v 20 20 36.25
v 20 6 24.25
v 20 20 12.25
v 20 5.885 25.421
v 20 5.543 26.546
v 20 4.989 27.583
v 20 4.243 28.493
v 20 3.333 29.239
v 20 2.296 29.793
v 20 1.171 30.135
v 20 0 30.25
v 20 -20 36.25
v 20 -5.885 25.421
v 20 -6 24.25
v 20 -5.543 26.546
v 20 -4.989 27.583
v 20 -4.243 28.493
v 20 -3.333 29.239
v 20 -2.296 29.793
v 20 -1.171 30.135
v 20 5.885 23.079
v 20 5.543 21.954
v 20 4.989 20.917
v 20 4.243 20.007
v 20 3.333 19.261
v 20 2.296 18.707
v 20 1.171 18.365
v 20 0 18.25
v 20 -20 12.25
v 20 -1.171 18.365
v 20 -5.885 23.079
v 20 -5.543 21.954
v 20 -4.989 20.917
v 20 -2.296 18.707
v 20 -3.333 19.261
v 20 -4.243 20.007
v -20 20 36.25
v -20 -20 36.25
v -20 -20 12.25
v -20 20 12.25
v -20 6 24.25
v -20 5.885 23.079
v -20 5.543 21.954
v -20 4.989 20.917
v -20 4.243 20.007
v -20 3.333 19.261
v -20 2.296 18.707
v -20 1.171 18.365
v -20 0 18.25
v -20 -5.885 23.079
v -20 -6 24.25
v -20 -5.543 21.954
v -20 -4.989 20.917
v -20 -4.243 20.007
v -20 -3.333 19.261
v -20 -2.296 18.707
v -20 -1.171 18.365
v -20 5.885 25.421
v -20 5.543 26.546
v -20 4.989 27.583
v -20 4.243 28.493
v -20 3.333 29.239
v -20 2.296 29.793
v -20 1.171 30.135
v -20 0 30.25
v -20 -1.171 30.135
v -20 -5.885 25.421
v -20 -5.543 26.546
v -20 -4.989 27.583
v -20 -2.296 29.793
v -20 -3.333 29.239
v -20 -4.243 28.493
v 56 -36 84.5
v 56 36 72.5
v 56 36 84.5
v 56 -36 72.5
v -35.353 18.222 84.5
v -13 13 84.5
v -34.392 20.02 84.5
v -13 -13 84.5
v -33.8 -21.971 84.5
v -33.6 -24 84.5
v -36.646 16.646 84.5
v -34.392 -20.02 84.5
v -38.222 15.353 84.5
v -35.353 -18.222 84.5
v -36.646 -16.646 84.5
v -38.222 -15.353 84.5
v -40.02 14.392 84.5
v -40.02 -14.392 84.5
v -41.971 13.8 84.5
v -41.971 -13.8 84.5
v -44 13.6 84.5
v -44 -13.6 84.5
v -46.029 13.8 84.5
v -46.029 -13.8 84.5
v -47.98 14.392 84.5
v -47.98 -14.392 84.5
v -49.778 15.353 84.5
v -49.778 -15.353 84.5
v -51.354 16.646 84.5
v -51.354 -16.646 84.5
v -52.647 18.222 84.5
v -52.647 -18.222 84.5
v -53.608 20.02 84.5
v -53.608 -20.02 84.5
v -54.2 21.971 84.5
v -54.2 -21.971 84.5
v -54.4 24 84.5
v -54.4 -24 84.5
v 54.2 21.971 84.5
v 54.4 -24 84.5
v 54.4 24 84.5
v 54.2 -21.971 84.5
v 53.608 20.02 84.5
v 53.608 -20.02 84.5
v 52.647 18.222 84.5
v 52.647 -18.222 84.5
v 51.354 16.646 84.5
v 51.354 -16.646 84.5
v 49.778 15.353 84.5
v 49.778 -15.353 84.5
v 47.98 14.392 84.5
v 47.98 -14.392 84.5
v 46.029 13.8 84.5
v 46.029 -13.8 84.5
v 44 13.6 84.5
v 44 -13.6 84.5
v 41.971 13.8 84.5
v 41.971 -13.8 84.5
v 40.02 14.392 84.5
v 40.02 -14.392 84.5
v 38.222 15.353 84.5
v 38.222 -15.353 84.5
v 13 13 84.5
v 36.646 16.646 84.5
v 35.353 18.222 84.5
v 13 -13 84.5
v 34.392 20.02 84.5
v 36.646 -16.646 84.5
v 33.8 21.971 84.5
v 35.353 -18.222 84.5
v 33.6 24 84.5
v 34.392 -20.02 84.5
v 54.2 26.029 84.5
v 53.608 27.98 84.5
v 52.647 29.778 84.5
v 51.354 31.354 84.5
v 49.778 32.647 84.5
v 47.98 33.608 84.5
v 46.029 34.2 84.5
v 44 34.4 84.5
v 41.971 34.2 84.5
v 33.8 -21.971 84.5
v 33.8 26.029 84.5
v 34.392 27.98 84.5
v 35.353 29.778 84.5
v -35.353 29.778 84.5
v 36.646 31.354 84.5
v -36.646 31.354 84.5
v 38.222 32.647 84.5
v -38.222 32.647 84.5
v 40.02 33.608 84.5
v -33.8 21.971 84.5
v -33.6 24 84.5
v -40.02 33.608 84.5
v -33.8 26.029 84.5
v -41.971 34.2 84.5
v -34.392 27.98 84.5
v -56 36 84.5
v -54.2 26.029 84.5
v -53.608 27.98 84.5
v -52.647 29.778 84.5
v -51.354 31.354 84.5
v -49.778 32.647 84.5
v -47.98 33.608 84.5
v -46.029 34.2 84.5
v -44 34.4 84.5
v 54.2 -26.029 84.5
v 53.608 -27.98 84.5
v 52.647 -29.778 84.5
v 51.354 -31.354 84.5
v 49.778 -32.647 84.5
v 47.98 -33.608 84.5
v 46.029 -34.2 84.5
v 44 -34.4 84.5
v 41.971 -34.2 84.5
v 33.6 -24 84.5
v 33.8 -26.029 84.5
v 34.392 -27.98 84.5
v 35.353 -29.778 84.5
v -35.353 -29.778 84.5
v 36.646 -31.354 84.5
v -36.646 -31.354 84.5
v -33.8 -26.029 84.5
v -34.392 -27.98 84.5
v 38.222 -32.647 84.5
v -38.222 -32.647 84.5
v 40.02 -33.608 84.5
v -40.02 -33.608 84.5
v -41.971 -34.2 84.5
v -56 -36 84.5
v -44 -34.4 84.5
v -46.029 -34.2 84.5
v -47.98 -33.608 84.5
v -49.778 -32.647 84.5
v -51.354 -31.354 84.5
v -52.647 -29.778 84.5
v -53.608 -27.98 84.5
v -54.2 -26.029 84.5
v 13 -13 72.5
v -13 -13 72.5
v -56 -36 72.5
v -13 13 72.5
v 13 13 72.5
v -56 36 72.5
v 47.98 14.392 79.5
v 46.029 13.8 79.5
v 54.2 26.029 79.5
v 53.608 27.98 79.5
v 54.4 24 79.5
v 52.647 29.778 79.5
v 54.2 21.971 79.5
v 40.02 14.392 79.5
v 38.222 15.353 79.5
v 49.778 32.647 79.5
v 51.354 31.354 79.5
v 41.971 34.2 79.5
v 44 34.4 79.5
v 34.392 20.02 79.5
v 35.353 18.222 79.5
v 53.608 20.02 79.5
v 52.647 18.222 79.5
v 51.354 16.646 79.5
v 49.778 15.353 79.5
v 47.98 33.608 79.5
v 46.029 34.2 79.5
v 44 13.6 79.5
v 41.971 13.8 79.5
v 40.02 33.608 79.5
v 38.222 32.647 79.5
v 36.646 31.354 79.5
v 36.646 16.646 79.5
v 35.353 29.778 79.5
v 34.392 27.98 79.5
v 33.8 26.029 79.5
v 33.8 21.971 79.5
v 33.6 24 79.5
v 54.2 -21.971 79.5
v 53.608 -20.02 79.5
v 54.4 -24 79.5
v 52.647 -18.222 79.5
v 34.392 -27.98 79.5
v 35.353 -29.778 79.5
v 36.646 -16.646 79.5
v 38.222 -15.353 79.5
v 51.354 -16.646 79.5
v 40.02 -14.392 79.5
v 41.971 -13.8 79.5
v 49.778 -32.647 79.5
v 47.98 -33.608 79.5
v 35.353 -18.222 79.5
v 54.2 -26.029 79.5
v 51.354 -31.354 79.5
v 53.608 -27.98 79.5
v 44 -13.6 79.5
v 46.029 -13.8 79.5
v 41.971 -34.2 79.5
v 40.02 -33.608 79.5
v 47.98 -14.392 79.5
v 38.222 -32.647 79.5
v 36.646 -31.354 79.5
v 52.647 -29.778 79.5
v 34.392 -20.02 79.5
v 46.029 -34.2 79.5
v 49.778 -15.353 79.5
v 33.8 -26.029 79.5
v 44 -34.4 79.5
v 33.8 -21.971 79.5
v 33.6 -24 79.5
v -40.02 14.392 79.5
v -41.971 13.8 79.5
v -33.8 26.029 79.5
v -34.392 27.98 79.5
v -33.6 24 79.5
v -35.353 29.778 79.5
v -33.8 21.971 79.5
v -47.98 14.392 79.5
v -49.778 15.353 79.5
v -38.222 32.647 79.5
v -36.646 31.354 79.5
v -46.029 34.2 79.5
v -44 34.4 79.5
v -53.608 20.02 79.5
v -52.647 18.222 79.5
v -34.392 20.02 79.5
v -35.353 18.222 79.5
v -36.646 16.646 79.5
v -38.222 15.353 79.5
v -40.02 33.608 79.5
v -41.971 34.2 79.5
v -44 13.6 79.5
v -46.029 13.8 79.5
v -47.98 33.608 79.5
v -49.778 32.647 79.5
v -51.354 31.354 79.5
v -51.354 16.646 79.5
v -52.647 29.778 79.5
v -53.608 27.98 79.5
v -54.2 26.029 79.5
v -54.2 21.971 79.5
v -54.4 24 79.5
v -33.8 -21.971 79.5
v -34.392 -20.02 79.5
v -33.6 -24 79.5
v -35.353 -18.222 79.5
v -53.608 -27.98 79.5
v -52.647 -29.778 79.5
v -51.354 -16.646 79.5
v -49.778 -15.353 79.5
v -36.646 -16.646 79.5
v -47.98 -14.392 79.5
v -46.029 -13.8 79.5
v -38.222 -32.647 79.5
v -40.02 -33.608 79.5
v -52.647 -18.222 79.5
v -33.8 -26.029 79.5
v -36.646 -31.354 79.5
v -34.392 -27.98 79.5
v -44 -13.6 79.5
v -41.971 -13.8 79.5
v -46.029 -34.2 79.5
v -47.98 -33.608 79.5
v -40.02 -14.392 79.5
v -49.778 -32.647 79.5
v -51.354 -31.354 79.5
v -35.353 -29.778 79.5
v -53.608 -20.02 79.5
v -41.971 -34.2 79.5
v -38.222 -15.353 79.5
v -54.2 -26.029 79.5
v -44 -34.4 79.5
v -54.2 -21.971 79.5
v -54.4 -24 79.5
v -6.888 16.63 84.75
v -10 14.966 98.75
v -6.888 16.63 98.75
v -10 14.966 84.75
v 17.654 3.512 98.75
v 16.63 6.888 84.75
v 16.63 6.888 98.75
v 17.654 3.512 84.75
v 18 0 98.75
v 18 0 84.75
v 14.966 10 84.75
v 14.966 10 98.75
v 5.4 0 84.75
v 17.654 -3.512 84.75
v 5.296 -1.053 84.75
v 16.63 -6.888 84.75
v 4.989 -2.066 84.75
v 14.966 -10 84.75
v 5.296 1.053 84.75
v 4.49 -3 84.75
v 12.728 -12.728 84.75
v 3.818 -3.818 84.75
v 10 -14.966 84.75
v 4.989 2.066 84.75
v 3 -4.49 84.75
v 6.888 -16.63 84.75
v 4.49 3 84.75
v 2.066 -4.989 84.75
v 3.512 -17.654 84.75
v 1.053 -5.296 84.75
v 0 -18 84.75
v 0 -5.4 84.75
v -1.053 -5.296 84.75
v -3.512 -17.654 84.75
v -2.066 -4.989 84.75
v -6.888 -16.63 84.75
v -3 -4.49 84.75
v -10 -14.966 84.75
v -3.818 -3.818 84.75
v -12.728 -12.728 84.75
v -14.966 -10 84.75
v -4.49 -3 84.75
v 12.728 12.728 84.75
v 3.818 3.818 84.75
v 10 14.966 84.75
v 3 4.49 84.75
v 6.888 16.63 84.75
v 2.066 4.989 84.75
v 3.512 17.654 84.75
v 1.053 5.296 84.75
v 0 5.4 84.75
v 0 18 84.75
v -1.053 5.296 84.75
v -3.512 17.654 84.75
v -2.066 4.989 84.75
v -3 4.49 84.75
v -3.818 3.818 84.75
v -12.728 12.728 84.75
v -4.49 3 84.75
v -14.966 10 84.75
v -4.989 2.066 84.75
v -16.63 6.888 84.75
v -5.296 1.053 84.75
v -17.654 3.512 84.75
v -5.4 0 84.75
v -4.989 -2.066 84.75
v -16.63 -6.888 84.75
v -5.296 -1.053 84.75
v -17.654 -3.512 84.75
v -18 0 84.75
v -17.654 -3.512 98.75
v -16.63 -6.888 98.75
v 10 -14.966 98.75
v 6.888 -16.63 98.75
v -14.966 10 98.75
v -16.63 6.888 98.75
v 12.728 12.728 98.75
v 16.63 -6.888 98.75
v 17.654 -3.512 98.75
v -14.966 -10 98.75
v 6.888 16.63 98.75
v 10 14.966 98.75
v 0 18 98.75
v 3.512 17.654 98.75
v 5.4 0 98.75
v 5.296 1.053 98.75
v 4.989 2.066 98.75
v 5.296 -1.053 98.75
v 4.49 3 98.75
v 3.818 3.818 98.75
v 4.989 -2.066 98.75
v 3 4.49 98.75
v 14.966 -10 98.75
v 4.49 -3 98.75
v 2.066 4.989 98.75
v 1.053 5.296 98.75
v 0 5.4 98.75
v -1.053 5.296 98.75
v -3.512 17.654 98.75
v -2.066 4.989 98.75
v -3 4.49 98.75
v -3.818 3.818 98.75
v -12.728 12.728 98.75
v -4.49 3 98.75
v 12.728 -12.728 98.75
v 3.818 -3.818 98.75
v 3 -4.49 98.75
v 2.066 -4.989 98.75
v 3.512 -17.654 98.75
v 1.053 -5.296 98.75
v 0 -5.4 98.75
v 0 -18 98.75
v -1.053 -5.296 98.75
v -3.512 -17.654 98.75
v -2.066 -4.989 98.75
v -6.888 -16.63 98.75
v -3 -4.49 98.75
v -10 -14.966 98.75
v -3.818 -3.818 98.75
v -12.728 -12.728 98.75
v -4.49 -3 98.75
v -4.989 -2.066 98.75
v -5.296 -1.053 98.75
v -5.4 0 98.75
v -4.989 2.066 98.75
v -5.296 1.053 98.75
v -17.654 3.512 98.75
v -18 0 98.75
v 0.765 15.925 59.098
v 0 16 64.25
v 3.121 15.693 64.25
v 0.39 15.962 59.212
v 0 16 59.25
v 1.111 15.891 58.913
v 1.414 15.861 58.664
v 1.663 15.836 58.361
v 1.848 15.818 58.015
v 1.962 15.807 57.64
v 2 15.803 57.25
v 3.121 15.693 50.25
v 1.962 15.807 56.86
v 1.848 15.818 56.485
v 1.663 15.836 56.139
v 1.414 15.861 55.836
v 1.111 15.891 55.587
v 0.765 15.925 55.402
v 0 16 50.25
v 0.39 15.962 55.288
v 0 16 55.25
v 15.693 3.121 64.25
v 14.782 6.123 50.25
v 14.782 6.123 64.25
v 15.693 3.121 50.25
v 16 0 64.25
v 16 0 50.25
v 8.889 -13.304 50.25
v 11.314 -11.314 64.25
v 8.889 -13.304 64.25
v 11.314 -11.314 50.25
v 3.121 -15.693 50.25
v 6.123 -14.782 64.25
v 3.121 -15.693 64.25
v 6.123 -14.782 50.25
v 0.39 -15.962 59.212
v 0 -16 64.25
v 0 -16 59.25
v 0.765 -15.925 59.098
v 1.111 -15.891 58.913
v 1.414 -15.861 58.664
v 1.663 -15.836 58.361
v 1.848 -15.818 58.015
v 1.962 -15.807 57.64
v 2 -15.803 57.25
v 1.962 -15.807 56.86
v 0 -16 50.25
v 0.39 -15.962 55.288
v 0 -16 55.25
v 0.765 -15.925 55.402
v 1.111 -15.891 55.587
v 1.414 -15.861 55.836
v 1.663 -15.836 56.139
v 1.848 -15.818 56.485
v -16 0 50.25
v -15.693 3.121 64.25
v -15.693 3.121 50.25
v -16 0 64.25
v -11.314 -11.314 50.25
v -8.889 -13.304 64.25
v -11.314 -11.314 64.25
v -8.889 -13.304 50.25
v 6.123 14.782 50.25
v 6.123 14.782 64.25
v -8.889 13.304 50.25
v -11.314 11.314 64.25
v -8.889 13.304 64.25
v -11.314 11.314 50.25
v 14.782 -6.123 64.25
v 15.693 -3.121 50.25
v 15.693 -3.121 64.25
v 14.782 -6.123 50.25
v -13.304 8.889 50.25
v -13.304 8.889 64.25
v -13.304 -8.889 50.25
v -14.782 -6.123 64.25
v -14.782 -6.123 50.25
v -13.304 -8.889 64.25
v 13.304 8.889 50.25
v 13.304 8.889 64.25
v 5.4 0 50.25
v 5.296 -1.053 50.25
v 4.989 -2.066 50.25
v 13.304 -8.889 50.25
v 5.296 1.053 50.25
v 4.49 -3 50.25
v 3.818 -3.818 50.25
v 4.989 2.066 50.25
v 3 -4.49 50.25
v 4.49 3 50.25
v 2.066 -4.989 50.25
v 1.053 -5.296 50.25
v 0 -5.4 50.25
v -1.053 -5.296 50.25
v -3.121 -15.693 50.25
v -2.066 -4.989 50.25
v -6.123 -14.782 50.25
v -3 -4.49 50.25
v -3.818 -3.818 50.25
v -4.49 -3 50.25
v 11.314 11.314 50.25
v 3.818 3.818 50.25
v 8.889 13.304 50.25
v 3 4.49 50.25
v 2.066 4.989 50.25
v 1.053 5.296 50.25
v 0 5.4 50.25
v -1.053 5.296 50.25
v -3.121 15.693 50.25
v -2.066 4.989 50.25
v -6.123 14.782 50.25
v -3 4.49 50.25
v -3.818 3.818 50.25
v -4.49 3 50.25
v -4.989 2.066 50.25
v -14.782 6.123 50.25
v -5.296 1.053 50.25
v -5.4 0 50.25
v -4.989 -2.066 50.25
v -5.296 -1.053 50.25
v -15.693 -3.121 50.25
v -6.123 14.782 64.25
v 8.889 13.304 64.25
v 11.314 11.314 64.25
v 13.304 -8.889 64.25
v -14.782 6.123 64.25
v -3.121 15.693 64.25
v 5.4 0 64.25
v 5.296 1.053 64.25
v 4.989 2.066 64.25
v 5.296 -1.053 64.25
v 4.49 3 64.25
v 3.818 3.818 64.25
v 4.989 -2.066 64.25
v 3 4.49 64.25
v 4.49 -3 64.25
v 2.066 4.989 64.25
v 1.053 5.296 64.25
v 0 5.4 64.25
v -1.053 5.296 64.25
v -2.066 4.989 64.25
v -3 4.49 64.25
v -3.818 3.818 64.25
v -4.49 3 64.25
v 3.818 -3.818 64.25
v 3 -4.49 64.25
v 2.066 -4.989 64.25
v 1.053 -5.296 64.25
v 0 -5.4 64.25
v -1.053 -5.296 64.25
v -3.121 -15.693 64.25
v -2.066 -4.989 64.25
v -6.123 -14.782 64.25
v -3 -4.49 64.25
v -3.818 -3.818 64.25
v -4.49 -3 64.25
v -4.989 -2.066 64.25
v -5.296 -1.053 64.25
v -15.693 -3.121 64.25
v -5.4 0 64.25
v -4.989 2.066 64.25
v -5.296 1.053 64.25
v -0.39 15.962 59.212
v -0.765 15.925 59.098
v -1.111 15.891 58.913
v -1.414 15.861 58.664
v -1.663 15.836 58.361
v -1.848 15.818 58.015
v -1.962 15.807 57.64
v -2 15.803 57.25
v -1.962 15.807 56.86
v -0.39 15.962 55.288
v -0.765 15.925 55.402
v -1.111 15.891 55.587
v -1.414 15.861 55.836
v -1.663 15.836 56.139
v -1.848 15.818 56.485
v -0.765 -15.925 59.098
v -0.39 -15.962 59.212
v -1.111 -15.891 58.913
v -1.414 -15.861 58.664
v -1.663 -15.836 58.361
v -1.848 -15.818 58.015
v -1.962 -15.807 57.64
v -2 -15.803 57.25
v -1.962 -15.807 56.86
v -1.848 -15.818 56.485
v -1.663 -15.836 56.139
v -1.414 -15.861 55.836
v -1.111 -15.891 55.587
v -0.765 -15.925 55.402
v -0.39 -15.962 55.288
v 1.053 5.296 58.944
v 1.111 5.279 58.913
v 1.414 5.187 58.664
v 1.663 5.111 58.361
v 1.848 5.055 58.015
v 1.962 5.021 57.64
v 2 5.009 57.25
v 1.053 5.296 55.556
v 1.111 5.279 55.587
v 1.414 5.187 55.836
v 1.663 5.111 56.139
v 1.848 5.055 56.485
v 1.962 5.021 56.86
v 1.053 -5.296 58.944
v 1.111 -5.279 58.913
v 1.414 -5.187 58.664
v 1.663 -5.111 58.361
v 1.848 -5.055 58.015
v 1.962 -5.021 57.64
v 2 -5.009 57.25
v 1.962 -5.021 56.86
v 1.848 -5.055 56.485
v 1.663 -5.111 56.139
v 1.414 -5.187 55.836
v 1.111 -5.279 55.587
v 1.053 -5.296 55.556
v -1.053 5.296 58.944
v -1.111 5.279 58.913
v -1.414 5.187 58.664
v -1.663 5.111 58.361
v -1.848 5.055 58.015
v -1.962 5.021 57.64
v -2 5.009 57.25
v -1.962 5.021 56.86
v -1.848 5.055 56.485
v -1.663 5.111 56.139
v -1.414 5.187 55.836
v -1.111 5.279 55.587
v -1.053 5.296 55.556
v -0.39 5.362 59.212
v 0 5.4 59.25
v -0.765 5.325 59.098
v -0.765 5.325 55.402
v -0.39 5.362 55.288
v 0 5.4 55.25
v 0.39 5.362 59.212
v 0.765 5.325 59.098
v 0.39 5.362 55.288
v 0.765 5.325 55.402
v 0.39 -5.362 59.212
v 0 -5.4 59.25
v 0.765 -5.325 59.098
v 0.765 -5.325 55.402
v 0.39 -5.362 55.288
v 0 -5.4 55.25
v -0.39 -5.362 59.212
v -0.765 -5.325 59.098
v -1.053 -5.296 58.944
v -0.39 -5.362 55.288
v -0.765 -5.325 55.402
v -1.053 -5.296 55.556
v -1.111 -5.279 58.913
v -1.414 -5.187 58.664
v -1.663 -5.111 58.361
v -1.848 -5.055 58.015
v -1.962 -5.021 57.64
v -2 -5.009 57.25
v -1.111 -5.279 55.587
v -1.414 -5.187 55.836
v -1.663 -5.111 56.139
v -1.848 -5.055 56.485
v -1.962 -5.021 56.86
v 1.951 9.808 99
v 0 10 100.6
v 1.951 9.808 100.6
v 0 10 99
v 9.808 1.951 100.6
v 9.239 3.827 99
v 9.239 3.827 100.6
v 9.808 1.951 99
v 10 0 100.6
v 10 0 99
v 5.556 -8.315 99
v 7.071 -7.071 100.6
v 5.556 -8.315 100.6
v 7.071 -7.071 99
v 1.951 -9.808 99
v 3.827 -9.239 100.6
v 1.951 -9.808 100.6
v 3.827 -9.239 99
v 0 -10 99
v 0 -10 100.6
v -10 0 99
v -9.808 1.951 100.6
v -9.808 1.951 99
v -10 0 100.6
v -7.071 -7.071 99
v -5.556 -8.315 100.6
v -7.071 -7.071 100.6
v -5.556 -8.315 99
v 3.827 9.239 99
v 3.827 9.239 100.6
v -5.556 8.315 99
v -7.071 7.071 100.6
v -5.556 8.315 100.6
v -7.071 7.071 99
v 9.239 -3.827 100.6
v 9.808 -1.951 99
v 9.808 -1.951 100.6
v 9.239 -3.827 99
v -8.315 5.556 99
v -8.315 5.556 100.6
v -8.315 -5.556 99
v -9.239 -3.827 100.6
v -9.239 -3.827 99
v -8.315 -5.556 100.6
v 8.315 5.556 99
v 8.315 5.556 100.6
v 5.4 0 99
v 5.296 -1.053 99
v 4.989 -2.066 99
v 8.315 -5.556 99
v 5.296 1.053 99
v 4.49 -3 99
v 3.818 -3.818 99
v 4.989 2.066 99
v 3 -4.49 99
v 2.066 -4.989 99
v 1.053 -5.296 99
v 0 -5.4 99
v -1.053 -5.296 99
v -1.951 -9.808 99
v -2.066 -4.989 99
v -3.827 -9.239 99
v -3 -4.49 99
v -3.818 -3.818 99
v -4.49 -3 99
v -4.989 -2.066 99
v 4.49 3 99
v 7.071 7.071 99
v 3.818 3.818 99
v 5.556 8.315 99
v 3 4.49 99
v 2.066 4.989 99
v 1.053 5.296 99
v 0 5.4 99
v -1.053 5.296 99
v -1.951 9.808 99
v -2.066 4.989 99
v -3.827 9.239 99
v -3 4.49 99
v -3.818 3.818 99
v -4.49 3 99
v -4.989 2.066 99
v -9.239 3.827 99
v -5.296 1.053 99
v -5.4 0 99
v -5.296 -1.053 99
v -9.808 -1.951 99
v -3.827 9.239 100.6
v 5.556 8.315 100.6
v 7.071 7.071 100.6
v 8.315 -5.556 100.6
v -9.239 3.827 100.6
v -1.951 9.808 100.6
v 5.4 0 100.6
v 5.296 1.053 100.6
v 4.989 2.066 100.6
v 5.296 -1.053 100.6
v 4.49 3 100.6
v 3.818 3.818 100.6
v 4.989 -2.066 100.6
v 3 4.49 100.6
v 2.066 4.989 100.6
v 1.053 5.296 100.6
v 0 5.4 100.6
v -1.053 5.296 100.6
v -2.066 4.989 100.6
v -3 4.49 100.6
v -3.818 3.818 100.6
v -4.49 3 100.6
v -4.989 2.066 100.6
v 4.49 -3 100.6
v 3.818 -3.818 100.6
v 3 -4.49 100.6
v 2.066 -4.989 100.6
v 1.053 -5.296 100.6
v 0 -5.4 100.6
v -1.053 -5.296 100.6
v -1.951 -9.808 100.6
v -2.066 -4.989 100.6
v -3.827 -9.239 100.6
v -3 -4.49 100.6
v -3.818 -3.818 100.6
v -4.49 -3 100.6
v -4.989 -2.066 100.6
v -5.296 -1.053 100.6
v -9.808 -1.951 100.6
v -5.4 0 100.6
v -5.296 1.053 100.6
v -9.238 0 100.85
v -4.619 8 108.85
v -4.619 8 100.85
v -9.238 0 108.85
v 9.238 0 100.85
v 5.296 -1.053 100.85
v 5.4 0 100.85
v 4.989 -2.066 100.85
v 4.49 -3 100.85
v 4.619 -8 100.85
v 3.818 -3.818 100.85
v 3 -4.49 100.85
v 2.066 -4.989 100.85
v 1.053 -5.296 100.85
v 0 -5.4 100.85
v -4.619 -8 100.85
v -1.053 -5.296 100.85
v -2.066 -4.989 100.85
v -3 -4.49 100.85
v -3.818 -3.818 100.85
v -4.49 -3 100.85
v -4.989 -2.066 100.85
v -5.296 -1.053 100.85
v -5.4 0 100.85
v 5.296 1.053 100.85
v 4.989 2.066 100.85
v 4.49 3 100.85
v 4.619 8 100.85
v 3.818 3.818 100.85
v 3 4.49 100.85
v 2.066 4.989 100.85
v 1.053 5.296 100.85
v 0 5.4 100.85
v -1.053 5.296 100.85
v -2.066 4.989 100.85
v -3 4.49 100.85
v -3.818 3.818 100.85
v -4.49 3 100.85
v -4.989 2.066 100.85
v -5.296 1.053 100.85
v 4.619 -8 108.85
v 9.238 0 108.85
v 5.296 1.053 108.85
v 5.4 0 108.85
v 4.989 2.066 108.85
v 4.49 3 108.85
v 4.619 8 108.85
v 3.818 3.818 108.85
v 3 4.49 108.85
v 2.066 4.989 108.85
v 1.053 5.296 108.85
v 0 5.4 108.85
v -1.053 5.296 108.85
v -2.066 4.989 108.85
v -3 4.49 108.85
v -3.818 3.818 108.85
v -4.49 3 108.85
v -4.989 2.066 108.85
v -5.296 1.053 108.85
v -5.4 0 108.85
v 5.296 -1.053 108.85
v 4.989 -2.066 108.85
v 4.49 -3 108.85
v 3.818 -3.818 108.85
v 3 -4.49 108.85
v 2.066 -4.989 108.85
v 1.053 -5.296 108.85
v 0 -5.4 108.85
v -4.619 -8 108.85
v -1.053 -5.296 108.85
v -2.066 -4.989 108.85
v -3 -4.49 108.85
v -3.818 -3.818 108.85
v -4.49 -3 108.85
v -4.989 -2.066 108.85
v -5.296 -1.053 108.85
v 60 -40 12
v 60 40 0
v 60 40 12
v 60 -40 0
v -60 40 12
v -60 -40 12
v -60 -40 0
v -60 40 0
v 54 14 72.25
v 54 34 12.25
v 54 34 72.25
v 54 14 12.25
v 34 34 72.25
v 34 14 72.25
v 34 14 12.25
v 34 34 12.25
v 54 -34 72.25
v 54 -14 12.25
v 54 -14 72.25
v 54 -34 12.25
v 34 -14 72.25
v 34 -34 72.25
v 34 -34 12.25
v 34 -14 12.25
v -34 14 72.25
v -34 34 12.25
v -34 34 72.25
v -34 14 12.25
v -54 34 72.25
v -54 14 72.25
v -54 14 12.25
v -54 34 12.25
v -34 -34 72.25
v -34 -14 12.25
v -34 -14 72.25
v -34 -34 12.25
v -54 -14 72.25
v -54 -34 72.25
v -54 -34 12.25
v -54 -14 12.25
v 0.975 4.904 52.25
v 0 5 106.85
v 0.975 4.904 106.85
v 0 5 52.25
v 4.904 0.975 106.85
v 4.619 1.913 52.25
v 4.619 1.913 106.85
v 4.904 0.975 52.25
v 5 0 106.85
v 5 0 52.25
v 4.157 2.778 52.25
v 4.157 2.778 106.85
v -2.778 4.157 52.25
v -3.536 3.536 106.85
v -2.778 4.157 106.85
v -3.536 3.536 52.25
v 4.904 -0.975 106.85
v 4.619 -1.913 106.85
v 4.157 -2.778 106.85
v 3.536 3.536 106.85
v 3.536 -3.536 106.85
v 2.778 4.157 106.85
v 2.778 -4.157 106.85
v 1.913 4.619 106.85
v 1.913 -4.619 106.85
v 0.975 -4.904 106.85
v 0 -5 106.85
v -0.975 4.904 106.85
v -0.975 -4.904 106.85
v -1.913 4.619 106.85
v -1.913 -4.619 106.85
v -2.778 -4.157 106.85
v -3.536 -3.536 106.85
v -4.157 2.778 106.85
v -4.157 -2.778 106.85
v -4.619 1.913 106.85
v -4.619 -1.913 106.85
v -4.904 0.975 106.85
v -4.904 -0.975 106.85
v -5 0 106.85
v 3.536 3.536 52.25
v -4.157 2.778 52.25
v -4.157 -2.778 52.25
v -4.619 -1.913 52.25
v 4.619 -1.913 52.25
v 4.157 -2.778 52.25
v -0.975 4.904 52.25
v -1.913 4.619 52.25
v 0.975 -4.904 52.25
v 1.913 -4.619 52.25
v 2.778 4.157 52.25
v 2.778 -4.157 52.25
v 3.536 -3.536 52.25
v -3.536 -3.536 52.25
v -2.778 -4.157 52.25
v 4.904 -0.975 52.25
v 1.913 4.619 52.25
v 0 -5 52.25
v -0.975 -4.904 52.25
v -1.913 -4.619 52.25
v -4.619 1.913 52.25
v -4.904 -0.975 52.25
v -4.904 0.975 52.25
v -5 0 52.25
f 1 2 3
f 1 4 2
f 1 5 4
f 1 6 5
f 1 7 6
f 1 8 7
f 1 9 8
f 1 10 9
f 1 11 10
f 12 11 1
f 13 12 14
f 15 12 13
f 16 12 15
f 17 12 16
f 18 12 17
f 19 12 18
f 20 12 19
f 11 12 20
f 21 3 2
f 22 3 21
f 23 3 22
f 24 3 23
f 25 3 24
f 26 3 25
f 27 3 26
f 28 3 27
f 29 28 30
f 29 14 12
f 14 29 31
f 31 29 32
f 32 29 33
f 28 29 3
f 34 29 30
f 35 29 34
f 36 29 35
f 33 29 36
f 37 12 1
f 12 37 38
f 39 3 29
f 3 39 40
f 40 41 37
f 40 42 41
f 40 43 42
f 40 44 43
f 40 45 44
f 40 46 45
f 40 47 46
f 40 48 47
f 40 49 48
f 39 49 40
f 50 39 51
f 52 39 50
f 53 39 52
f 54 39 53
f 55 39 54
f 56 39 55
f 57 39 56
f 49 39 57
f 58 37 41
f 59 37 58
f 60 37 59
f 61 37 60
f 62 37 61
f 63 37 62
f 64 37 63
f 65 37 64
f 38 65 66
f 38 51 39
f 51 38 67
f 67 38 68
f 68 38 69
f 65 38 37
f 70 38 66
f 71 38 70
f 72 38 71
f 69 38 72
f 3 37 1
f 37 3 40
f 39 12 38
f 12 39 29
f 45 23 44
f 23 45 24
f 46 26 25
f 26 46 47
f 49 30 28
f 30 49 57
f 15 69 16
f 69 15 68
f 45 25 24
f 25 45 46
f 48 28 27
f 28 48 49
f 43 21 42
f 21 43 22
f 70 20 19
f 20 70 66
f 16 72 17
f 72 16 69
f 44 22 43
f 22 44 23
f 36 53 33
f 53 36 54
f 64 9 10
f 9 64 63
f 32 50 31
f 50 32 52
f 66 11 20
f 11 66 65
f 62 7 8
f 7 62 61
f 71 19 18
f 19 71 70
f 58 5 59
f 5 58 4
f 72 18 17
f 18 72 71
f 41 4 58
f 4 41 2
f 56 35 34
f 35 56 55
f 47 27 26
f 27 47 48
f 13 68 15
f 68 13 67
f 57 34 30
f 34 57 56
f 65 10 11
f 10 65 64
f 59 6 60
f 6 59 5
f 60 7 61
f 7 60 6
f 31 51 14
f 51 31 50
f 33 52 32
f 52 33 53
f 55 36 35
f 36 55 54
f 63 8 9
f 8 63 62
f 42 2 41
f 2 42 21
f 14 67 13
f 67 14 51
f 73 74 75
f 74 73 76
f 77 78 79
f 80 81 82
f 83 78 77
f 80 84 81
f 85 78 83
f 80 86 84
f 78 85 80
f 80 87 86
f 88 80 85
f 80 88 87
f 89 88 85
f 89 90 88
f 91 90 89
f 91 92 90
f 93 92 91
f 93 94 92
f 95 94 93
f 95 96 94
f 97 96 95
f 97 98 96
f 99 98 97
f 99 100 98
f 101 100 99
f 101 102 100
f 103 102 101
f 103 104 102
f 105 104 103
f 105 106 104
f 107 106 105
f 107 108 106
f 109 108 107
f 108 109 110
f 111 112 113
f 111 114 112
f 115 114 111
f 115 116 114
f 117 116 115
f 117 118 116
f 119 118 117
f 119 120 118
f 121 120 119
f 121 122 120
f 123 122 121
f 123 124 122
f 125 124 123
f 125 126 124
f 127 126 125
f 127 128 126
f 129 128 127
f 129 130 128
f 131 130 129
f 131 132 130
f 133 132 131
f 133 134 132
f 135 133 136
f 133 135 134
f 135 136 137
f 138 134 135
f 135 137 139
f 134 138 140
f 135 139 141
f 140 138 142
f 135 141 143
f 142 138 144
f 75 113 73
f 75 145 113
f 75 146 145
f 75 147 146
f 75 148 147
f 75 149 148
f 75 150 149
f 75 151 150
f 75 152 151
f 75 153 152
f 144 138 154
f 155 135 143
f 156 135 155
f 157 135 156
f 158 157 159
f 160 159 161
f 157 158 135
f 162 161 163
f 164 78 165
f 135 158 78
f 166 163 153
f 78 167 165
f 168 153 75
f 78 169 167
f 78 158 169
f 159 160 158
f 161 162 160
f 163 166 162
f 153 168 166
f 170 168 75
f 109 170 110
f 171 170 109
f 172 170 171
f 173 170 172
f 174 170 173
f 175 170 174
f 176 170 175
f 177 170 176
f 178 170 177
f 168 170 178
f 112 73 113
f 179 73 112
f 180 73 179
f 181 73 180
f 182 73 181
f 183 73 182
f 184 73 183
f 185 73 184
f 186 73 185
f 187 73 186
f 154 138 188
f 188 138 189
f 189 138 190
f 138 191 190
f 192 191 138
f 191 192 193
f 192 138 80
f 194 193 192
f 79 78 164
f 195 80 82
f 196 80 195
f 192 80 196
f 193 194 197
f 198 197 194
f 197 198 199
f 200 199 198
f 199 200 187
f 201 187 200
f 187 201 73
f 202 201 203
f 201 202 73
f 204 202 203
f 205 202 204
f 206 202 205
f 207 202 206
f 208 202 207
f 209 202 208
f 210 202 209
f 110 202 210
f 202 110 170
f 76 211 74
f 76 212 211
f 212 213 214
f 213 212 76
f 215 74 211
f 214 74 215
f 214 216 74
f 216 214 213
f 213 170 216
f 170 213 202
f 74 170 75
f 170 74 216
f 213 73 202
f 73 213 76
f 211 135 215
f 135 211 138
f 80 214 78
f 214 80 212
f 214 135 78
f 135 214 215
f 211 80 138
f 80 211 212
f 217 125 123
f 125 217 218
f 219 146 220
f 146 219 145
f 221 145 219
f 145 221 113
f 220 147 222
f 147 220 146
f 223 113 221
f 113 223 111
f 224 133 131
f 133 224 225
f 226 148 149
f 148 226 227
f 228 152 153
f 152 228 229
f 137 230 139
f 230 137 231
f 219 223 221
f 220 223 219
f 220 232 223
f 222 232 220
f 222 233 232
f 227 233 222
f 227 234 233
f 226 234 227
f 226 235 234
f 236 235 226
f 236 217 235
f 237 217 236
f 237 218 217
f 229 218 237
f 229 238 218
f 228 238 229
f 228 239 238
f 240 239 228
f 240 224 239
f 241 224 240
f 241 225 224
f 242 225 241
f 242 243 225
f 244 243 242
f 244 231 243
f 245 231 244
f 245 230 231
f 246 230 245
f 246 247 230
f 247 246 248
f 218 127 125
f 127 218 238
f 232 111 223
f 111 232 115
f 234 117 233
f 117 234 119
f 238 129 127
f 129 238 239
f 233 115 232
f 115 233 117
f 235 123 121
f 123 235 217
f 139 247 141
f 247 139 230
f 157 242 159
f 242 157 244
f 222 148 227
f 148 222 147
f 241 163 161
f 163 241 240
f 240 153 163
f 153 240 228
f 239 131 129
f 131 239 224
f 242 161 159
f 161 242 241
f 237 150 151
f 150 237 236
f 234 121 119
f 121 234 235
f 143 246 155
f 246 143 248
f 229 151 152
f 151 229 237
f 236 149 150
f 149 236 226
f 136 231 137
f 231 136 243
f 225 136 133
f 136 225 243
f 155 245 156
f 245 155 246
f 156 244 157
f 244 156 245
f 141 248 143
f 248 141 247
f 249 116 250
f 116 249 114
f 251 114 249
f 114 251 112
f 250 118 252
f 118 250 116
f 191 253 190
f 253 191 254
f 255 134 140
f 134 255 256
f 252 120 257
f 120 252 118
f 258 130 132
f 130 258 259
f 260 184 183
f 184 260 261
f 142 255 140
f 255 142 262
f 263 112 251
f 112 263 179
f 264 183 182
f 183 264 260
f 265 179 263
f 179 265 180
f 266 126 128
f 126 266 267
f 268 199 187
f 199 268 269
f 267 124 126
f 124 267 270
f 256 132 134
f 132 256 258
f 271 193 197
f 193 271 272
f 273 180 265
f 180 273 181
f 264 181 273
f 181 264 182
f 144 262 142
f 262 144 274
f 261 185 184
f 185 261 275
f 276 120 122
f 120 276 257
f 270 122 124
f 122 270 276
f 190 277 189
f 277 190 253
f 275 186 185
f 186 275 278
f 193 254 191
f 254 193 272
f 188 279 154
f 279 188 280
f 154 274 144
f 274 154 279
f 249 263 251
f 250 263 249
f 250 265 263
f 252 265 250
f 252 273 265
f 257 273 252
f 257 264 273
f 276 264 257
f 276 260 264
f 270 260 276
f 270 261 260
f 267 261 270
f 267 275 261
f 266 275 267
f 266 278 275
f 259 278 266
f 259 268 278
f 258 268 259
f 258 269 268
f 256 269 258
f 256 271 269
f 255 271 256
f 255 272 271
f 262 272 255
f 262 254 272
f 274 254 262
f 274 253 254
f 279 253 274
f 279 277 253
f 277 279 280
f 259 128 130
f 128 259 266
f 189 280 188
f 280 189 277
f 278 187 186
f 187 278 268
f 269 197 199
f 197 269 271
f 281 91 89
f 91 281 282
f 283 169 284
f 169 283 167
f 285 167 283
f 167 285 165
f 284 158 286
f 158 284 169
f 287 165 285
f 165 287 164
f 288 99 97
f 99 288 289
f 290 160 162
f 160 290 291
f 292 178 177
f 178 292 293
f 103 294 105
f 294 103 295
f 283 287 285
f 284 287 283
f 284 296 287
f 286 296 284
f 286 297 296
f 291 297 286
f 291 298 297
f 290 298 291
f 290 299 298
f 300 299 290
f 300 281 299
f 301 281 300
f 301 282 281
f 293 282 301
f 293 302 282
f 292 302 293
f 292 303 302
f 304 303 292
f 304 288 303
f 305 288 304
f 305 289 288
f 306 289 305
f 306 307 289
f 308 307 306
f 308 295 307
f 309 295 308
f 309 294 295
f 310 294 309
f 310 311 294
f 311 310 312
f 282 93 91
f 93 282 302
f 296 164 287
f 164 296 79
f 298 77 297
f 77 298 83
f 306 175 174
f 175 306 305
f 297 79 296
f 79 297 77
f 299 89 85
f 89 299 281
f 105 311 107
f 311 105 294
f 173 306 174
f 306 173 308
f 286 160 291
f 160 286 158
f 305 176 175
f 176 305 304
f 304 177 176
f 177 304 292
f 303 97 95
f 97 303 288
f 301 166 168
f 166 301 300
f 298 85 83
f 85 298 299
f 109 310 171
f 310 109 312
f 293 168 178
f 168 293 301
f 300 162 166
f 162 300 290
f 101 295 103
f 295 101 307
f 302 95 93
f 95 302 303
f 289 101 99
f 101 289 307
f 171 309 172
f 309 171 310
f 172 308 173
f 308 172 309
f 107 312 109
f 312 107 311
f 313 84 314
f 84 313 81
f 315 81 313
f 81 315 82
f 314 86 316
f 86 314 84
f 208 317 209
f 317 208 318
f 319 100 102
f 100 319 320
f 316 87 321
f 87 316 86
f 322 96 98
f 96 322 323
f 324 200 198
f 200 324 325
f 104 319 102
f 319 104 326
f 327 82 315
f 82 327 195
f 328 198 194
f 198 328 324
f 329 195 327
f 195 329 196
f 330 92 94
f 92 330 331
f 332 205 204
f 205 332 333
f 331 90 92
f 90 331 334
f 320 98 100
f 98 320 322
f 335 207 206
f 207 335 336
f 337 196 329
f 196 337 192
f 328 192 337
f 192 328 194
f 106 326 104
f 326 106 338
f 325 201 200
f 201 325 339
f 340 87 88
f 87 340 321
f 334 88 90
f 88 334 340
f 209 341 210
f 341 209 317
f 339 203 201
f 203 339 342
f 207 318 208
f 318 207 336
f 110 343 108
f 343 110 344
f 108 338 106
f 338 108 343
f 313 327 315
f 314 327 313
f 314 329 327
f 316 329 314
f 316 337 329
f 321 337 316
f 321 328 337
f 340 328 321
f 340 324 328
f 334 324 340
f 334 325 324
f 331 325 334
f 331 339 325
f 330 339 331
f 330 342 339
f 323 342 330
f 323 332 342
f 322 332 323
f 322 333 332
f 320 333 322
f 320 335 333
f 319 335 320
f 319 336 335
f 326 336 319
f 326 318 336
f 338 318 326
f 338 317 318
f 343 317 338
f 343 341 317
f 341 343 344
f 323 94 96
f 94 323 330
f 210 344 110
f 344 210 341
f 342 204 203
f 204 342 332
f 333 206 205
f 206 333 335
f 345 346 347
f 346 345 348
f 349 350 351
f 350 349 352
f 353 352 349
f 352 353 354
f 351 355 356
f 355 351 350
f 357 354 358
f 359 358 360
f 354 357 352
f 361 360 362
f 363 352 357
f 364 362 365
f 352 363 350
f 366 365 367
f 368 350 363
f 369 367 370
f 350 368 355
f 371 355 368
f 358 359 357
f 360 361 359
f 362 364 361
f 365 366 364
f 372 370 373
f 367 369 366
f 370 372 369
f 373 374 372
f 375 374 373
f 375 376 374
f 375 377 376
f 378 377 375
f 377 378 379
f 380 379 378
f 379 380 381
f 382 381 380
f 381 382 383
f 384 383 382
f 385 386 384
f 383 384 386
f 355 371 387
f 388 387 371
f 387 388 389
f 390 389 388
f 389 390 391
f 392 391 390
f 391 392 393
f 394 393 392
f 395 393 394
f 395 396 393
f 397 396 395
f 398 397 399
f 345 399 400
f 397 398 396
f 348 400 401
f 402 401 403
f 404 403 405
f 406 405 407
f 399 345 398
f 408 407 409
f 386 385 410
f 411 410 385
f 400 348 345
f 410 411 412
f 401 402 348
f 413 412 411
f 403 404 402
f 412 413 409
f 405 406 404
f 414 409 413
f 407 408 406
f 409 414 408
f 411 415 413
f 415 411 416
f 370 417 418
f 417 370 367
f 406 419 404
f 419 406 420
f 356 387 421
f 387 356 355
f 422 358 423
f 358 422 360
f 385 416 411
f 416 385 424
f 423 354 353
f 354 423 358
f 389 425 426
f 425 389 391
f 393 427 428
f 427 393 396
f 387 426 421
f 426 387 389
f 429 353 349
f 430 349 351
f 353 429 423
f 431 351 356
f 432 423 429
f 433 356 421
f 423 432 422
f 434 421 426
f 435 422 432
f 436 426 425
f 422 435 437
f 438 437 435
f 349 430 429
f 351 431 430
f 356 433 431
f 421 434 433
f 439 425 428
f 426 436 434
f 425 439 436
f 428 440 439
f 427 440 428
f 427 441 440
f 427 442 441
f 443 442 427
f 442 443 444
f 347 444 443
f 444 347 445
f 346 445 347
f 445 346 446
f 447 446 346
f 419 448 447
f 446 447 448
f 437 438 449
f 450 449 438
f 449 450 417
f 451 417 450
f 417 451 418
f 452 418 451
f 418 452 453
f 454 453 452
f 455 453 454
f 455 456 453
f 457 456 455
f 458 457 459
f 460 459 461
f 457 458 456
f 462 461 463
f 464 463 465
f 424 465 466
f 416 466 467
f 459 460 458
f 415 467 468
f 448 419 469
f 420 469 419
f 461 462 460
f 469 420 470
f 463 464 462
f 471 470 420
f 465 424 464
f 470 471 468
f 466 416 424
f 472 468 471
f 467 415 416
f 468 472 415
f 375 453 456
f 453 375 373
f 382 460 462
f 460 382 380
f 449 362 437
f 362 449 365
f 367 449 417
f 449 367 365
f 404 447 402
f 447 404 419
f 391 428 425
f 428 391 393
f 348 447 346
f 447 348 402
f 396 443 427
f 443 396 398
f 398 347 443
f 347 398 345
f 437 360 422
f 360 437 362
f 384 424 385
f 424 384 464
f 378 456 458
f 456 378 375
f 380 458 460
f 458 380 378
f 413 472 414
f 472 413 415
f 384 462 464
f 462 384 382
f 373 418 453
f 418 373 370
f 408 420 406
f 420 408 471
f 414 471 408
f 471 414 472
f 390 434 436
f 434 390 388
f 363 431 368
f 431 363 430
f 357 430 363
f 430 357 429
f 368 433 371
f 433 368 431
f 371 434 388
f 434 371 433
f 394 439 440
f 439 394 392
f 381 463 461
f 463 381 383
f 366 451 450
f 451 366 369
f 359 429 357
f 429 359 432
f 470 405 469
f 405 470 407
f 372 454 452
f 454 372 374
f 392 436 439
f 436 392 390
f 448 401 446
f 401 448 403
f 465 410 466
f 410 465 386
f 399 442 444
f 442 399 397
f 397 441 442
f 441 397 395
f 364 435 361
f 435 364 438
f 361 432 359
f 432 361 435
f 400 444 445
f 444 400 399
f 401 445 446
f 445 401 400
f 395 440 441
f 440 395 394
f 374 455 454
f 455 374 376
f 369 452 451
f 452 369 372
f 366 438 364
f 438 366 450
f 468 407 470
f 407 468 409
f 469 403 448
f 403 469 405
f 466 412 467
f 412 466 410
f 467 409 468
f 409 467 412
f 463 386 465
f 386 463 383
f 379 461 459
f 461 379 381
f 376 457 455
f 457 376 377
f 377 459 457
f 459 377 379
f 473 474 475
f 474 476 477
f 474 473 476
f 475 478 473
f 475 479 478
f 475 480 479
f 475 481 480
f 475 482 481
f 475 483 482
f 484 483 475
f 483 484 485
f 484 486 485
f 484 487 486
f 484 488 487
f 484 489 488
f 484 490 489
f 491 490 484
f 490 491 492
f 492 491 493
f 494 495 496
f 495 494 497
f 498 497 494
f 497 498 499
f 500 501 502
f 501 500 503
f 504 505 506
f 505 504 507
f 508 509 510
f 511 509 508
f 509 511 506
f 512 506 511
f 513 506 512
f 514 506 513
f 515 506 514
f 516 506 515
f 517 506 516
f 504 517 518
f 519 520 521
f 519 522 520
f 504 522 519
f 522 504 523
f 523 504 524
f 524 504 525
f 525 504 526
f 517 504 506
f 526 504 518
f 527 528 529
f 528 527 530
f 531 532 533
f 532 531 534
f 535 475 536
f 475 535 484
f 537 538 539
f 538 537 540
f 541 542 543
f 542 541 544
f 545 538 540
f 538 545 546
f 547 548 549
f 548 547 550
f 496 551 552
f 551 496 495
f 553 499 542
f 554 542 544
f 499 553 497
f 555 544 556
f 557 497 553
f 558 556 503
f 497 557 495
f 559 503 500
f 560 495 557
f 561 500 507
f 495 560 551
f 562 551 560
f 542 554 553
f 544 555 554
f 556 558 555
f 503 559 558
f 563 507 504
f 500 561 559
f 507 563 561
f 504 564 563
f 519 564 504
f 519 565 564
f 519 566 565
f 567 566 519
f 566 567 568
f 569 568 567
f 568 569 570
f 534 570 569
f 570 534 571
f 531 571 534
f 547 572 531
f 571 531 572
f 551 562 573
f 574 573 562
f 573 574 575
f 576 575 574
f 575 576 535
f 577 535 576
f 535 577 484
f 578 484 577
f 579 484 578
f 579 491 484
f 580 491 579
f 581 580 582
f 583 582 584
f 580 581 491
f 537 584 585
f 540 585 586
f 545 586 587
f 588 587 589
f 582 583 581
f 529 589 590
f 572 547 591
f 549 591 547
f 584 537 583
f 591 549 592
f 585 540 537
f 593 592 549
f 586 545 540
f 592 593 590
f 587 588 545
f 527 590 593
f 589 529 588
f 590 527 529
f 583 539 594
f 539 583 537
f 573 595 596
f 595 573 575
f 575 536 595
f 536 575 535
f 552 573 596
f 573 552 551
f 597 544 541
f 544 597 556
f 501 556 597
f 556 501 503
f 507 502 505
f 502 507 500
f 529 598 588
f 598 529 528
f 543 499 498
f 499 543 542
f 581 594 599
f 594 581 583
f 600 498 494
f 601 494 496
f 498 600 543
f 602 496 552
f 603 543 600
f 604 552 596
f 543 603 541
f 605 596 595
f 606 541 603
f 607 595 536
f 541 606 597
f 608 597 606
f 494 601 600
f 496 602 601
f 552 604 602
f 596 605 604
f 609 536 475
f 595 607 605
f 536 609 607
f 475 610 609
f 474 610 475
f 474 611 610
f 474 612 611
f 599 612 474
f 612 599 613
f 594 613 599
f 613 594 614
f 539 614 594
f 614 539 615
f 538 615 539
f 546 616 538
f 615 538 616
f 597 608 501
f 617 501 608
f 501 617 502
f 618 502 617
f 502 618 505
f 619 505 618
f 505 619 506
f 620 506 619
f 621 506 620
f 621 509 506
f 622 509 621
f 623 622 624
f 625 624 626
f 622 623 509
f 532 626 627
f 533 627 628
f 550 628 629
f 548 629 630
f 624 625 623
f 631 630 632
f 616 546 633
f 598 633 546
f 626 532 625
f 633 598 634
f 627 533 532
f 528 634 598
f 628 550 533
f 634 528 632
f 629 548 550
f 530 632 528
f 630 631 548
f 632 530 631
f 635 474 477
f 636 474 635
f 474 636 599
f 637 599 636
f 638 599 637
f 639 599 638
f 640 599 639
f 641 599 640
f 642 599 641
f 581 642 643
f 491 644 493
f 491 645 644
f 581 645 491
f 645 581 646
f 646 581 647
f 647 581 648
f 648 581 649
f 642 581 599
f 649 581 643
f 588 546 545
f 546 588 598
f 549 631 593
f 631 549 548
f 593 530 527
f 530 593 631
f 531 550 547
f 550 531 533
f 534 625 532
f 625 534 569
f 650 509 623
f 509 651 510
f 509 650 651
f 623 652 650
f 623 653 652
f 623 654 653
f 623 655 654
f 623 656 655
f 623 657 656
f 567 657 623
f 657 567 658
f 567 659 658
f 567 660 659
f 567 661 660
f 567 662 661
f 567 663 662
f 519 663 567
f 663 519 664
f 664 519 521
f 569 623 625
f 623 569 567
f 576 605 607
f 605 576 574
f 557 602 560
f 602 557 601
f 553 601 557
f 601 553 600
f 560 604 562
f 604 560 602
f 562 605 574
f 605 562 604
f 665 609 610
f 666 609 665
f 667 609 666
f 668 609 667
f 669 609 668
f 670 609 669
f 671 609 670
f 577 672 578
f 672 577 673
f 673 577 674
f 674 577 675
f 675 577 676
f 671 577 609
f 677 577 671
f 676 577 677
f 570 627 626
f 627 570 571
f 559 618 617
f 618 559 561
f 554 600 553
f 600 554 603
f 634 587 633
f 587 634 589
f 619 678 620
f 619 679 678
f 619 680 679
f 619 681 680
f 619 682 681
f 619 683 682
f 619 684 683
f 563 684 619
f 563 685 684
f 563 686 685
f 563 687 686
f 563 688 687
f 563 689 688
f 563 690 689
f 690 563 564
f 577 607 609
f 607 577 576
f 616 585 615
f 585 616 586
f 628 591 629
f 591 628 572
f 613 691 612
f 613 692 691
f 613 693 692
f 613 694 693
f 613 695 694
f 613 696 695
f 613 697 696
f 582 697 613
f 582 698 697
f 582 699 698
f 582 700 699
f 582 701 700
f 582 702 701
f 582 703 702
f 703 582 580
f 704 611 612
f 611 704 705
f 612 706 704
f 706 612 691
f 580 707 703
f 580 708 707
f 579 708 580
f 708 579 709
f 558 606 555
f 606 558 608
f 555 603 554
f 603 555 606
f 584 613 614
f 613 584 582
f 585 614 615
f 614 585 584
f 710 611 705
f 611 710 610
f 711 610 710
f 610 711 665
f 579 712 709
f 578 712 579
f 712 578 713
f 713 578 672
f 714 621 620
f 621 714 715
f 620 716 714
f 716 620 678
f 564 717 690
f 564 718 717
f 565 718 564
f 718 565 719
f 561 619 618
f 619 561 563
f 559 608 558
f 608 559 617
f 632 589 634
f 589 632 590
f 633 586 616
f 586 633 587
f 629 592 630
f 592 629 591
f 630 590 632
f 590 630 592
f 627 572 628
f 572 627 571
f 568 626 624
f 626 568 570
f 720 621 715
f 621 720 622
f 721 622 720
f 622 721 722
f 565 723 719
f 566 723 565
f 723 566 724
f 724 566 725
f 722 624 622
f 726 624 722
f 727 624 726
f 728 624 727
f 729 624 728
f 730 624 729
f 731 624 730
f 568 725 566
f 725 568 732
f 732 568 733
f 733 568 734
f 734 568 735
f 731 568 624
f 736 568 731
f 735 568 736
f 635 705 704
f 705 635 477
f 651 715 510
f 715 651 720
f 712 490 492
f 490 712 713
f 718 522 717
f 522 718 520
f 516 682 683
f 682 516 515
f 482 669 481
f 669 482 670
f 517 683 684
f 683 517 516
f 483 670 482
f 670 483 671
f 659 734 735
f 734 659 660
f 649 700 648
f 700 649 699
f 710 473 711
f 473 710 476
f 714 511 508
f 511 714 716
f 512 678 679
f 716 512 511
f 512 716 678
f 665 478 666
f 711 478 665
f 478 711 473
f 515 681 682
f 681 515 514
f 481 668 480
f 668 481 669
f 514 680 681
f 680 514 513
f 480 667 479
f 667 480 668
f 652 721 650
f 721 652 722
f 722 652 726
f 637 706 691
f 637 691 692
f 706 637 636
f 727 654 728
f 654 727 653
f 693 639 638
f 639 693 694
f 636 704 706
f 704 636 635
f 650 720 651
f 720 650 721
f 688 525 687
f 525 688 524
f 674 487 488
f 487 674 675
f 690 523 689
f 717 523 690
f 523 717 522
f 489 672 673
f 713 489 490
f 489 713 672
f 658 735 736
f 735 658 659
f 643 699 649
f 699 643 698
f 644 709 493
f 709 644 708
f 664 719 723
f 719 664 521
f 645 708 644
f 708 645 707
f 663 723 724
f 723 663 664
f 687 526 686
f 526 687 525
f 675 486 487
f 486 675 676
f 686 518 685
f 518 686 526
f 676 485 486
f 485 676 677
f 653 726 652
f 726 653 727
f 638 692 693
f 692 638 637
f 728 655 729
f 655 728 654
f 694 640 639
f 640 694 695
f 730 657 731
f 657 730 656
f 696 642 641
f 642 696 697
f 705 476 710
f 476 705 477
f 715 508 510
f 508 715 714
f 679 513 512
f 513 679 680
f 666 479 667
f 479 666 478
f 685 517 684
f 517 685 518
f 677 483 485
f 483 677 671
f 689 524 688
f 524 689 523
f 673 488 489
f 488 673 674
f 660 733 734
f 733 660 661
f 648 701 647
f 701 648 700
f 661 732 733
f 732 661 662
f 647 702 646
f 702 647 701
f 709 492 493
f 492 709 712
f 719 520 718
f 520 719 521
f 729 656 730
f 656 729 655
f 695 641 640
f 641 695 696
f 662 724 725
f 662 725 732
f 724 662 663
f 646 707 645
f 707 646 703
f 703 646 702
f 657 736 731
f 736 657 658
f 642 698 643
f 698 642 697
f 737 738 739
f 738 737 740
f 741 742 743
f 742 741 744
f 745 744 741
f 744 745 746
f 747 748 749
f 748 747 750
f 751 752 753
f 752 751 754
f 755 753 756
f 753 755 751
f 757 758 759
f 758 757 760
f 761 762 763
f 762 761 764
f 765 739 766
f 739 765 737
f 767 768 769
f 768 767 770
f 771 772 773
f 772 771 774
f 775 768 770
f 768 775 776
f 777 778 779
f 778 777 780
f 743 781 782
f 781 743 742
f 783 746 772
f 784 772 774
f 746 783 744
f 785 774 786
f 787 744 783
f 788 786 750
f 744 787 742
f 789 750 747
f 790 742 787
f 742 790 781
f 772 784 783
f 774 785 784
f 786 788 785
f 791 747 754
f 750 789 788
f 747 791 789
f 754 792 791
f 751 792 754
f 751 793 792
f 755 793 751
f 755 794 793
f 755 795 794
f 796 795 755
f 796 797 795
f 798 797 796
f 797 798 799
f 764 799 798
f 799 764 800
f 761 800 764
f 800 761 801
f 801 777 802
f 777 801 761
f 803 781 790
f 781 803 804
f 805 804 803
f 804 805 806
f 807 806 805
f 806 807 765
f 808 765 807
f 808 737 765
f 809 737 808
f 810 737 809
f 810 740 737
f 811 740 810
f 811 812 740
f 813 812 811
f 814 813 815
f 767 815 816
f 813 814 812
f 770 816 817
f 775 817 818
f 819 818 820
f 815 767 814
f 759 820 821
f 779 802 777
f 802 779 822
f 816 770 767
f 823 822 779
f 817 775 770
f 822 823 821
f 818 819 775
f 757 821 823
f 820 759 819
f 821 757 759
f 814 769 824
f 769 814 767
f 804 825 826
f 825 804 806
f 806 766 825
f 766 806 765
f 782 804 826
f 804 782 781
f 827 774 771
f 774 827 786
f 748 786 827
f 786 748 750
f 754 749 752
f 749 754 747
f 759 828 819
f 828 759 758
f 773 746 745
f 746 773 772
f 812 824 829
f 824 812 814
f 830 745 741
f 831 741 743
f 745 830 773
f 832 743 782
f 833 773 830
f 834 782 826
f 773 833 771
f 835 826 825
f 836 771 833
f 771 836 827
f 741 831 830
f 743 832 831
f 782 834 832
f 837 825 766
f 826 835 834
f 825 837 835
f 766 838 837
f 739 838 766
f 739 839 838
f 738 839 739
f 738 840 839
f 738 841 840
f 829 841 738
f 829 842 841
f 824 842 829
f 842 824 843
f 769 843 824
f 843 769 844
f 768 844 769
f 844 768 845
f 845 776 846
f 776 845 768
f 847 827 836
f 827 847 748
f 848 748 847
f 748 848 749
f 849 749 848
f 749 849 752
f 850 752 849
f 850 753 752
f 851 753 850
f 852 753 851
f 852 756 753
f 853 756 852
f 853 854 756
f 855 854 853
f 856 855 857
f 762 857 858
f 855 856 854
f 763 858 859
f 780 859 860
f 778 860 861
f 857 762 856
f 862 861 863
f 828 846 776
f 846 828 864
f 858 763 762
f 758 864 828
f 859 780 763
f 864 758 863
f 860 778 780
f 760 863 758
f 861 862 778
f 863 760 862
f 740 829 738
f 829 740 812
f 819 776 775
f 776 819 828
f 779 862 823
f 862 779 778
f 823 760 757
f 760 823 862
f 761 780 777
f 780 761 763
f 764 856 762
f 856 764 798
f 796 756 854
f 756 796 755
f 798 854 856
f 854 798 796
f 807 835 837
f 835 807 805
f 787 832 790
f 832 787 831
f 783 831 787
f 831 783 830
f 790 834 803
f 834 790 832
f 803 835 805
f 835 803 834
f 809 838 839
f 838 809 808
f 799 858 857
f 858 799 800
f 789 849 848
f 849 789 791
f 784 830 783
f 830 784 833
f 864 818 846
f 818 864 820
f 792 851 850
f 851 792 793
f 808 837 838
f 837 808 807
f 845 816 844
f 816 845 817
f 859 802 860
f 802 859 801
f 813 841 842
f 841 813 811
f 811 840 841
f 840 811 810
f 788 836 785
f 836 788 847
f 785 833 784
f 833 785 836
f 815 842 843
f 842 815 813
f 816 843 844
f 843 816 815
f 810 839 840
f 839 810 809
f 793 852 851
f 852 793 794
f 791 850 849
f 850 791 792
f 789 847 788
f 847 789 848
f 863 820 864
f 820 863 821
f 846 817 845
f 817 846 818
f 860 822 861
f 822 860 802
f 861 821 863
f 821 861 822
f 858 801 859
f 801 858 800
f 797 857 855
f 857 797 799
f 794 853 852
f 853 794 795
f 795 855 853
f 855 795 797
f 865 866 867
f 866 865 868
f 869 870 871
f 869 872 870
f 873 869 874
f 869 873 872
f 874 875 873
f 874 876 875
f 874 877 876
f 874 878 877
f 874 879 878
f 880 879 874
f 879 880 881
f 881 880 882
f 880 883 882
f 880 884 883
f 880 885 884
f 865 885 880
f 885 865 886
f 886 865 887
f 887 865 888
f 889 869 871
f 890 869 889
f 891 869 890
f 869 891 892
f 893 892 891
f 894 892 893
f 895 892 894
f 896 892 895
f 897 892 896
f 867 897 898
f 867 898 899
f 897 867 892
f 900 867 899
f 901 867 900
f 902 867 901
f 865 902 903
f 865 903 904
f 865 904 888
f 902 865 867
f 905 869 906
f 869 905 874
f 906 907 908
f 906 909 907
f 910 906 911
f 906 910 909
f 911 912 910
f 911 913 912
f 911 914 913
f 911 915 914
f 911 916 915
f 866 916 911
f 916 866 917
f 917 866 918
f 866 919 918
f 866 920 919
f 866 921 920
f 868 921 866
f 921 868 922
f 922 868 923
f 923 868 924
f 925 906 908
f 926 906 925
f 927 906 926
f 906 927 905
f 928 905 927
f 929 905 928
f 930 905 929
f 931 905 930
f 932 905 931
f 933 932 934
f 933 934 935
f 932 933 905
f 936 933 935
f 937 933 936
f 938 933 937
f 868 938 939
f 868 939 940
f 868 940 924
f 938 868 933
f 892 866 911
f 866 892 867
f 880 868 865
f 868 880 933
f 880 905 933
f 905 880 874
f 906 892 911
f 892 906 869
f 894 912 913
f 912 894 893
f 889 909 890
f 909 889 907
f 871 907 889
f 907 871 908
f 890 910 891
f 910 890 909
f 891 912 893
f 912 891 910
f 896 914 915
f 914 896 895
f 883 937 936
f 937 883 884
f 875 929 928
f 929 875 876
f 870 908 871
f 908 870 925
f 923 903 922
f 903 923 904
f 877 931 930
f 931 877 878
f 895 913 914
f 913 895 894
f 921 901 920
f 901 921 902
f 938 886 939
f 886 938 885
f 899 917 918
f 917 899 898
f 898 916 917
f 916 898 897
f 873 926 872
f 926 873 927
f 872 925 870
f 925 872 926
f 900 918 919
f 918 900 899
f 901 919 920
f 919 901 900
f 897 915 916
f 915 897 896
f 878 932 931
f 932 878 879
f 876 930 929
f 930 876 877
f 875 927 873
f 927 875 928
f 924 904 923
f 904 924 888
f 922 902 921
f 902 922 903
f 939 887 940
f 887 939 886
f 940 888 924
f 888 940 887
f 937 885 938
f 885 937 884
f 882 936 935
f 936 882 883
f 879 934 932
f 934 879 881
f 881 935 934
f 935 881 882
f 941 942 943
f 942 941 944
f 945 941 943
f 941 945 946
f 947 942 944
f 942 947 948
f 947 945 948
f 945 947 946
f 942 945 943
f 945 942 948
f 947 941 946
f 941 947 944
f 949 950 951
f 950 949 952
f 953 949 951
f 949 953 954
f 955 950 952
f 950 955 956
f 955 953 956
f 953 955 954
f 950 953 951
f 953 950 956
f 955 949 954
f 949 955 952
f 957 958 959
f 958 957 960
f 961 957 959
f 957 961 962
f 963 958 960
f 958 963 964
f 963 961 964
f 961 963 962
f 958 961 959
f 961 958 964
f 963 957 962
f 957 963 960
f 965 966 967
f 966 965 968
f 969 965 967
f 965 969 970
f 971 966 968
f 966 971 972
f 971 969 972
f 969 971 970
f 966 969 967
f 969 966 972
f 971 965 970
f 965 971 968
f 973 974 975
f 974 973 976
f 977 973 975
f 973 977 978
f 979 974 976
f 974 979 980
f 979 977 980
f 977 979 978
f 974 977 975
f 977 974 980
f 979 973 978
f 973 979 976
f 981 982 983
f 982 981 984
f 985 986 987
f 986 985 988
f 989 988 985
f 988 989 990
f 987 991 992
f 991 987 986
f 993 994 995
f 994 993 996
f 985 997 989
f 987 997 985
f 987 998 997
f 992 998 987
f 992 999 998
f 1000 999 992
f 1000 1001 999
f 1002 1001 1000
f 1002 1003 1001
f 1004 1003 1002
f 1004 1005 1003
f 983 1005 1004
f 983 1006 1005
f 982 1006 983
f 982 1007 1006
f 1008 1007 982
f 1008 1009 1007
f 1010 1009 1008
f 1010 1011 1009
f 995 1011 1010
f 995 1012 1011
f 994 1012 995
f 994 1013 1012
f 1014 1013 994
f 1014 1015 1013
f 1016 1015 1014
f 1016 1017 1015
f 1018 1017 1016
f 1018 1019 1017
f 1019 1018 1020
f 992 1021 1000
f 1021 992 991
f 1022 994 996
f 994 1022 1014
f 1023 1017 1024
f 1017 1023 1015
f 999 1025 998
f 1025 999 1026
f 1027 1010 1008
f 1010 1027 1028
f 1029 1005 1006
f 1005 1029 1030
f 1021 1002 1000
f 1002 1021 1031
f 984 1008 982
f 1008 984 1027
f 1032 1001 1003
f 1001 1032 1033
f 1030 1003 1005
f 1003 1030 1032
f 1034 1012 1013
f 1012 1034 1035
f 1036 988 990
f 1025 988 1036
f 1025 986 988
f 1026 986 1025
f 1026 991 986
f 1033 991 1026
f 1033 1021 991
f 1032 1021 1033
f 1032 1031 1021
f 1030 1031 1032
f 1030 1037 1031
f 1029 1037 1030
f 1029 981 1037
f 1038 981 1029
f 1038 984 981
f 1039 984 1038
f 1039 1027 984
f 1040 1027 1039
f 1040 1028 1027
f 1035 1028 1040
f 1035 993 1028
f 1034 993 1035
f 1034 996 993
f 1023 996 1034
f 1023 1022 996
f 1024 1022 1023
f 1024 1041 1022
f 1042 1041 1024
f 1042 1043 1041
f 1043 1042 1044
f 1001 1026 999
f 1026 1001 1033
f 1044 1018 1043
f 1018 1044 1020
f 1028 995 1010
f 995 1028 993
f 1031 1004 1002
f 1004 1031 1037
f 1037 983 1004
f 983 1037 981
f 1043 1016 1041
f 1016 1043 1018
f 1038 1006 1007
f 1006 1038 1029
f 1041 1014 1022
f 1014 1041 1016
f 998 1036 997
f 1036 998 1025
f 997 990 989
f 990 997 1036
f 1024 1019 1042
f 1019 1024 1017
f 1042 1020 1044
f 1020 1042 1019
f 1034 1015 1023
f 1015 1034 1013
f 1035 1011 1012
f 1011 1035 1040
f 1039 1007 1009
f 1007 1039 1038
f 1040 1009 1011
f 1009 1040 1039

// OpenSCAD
$fn = 32;

// ------------------------------------------------------------------------
// Arbor press fixture: screw d10, posts 60 mm, gap 14 mm
// Every part is its own module, assembly() places every instance.
// ------------------------------------------------------------------------

// --- part 1 ---
module press_bed() {
  difference() {
    translate([-60, -40, 0]) cube([120, 80, 12]);
  }
}

// --- part 2 ---
module anvil_block() {
  difference() {
    translate([-20, -20, 0]) cube([40, 40, 24]);
    translate([0, 0, 12]) rotate([0, 90, 0]) cylinder(h = 42, d = 12, center = true);
  }
}

// --- part 3 ---
module press_post_a() {
  translate([-10, -10, 0]) cube([20, 20, 60]);
}

// --- part 4 ---
module press_post_b() {
  translate([-10, -10, 0]) cube([20, 20, 60]);
}

// --- part 5 ---
module press_post_c() {
  translate([-10, -10, 0]) cube([20, 20, 60]);
}

// --- part 6 ---
module press_post_d() {
  translate([-10, -10, 0]) cube([20, 20, 60]);
}

// --- part 7 ---
module press_frame() {
  difference() {
    translate([-56, -36, 0]) cube([112, 72, 12]);
    translate([-13, -13, -1]) cube([26, 26, 14]);
    translate([44, 24, 7]) cylinder(h = 6, d = 20.8);
    translate([44, -24, 7]) cylinder(h = 6, d = 20.8);
    translate([-44, 24, 7]) cylinder(h = 6, d = 20.8);
    translate([-44, -24, 7]) cylinder(h = 6, d = 20.8);
  }
}

// --- part 8 ---
module guide_ring() {
  difference() {
      translate([0, 0, 0]) cylinder(h = 14, d = 36);
      translate([0, 0, -1]) cylinder(h = 16, d = 10.8);
    }
}

// --- part 9 ---
module press_screw() {
  translate([0, 0, -27.3]) cylinder(h = 54.6, d = 10);
}

// --- part 10 ---
module press_head() {
  difference() {
    cylinder(h = 14, d = 32);
    translate([0, 0, -1]) cylinder(h = 16, d = 10.8);
    translate([0, 0, 7]) rotate([90, 0, 0]) cylinder(h = 34, d = 4, center = true);
  }
}

// --- part 11 ---
module nut_washer() {
  difference() {
      translate([0, 0, 0]) cylinder(h = 1.6, d = 20);
      translate([0, 0, -1]) cylinder(h = 3.6, d = 10.8);
    }
}

// --- part 12 ---
module press_nut() {
  difference() {
    linear_extrude(height = 8) polygon(points = [[9.238, 0], [4.619, 8], [-4.619, 8], [-9.238, 0], [-4.619, -8], [4.619, -8]]);
    translate([0, 0, -1]) cylinder(h = 10, d = 10.8);
  }
}

// --- assembly ---
module assembly() {
  color([0.80, 0.24, 0.20]) translate([0, 0, 0]) rotate([0, 0, 0]) press_bed();
  color([0.20, 0.45, 0.75]) translate([0, 0, 12.25]) rotate([0, 0, 0]) anvil_block();
  color([0.25, 0.62, 0.32]) translate([44, 24, 12.25]) rotate([0, 0, 0]) press_post_a();
  color([0.92, 0.70, 0.18]) translate([44, -24, 12.25]) rotate([0, 0, 0]) press_post_b();
  color([0.58, 0.35, 0.70]) translate([-44, 24, 12.25]) rotate([0, 0, 0]) press_post_c();
  color([0.16, 0.66, 0.66]) translate([-44, -24, 12.25]) rotate([0, 0, 0]) press_post_d();
  color([0.85, 0.48, 0.18]) translate([0, 0, 72.5]) rotate([0, 0, 0]) press_frame();
  color([0.55, 0.60, 0.65]) translate([0, 0, 84.75]) rotate([0, 0, 0]) guide_ring();
  color([0.75, 0.30, 0.55]) translate([0, 0, 79.55]) rotate([0, 0, 0]) press_screw();
  color([0.42, 0.52, 0.28]) translate([0, 0, 50.25]) rotate([0, 0, 0]) press_head();
  color([0.80, 0.24, 0.20]) translate([0, 0, 99]) rotate([0, 0, 0]) nut_washer();
  color([0.20, 0.45, 0.75]) translate([0, 0, 100.85]) rotate([0, 0, 0]) press_nut();
}

assembly();
